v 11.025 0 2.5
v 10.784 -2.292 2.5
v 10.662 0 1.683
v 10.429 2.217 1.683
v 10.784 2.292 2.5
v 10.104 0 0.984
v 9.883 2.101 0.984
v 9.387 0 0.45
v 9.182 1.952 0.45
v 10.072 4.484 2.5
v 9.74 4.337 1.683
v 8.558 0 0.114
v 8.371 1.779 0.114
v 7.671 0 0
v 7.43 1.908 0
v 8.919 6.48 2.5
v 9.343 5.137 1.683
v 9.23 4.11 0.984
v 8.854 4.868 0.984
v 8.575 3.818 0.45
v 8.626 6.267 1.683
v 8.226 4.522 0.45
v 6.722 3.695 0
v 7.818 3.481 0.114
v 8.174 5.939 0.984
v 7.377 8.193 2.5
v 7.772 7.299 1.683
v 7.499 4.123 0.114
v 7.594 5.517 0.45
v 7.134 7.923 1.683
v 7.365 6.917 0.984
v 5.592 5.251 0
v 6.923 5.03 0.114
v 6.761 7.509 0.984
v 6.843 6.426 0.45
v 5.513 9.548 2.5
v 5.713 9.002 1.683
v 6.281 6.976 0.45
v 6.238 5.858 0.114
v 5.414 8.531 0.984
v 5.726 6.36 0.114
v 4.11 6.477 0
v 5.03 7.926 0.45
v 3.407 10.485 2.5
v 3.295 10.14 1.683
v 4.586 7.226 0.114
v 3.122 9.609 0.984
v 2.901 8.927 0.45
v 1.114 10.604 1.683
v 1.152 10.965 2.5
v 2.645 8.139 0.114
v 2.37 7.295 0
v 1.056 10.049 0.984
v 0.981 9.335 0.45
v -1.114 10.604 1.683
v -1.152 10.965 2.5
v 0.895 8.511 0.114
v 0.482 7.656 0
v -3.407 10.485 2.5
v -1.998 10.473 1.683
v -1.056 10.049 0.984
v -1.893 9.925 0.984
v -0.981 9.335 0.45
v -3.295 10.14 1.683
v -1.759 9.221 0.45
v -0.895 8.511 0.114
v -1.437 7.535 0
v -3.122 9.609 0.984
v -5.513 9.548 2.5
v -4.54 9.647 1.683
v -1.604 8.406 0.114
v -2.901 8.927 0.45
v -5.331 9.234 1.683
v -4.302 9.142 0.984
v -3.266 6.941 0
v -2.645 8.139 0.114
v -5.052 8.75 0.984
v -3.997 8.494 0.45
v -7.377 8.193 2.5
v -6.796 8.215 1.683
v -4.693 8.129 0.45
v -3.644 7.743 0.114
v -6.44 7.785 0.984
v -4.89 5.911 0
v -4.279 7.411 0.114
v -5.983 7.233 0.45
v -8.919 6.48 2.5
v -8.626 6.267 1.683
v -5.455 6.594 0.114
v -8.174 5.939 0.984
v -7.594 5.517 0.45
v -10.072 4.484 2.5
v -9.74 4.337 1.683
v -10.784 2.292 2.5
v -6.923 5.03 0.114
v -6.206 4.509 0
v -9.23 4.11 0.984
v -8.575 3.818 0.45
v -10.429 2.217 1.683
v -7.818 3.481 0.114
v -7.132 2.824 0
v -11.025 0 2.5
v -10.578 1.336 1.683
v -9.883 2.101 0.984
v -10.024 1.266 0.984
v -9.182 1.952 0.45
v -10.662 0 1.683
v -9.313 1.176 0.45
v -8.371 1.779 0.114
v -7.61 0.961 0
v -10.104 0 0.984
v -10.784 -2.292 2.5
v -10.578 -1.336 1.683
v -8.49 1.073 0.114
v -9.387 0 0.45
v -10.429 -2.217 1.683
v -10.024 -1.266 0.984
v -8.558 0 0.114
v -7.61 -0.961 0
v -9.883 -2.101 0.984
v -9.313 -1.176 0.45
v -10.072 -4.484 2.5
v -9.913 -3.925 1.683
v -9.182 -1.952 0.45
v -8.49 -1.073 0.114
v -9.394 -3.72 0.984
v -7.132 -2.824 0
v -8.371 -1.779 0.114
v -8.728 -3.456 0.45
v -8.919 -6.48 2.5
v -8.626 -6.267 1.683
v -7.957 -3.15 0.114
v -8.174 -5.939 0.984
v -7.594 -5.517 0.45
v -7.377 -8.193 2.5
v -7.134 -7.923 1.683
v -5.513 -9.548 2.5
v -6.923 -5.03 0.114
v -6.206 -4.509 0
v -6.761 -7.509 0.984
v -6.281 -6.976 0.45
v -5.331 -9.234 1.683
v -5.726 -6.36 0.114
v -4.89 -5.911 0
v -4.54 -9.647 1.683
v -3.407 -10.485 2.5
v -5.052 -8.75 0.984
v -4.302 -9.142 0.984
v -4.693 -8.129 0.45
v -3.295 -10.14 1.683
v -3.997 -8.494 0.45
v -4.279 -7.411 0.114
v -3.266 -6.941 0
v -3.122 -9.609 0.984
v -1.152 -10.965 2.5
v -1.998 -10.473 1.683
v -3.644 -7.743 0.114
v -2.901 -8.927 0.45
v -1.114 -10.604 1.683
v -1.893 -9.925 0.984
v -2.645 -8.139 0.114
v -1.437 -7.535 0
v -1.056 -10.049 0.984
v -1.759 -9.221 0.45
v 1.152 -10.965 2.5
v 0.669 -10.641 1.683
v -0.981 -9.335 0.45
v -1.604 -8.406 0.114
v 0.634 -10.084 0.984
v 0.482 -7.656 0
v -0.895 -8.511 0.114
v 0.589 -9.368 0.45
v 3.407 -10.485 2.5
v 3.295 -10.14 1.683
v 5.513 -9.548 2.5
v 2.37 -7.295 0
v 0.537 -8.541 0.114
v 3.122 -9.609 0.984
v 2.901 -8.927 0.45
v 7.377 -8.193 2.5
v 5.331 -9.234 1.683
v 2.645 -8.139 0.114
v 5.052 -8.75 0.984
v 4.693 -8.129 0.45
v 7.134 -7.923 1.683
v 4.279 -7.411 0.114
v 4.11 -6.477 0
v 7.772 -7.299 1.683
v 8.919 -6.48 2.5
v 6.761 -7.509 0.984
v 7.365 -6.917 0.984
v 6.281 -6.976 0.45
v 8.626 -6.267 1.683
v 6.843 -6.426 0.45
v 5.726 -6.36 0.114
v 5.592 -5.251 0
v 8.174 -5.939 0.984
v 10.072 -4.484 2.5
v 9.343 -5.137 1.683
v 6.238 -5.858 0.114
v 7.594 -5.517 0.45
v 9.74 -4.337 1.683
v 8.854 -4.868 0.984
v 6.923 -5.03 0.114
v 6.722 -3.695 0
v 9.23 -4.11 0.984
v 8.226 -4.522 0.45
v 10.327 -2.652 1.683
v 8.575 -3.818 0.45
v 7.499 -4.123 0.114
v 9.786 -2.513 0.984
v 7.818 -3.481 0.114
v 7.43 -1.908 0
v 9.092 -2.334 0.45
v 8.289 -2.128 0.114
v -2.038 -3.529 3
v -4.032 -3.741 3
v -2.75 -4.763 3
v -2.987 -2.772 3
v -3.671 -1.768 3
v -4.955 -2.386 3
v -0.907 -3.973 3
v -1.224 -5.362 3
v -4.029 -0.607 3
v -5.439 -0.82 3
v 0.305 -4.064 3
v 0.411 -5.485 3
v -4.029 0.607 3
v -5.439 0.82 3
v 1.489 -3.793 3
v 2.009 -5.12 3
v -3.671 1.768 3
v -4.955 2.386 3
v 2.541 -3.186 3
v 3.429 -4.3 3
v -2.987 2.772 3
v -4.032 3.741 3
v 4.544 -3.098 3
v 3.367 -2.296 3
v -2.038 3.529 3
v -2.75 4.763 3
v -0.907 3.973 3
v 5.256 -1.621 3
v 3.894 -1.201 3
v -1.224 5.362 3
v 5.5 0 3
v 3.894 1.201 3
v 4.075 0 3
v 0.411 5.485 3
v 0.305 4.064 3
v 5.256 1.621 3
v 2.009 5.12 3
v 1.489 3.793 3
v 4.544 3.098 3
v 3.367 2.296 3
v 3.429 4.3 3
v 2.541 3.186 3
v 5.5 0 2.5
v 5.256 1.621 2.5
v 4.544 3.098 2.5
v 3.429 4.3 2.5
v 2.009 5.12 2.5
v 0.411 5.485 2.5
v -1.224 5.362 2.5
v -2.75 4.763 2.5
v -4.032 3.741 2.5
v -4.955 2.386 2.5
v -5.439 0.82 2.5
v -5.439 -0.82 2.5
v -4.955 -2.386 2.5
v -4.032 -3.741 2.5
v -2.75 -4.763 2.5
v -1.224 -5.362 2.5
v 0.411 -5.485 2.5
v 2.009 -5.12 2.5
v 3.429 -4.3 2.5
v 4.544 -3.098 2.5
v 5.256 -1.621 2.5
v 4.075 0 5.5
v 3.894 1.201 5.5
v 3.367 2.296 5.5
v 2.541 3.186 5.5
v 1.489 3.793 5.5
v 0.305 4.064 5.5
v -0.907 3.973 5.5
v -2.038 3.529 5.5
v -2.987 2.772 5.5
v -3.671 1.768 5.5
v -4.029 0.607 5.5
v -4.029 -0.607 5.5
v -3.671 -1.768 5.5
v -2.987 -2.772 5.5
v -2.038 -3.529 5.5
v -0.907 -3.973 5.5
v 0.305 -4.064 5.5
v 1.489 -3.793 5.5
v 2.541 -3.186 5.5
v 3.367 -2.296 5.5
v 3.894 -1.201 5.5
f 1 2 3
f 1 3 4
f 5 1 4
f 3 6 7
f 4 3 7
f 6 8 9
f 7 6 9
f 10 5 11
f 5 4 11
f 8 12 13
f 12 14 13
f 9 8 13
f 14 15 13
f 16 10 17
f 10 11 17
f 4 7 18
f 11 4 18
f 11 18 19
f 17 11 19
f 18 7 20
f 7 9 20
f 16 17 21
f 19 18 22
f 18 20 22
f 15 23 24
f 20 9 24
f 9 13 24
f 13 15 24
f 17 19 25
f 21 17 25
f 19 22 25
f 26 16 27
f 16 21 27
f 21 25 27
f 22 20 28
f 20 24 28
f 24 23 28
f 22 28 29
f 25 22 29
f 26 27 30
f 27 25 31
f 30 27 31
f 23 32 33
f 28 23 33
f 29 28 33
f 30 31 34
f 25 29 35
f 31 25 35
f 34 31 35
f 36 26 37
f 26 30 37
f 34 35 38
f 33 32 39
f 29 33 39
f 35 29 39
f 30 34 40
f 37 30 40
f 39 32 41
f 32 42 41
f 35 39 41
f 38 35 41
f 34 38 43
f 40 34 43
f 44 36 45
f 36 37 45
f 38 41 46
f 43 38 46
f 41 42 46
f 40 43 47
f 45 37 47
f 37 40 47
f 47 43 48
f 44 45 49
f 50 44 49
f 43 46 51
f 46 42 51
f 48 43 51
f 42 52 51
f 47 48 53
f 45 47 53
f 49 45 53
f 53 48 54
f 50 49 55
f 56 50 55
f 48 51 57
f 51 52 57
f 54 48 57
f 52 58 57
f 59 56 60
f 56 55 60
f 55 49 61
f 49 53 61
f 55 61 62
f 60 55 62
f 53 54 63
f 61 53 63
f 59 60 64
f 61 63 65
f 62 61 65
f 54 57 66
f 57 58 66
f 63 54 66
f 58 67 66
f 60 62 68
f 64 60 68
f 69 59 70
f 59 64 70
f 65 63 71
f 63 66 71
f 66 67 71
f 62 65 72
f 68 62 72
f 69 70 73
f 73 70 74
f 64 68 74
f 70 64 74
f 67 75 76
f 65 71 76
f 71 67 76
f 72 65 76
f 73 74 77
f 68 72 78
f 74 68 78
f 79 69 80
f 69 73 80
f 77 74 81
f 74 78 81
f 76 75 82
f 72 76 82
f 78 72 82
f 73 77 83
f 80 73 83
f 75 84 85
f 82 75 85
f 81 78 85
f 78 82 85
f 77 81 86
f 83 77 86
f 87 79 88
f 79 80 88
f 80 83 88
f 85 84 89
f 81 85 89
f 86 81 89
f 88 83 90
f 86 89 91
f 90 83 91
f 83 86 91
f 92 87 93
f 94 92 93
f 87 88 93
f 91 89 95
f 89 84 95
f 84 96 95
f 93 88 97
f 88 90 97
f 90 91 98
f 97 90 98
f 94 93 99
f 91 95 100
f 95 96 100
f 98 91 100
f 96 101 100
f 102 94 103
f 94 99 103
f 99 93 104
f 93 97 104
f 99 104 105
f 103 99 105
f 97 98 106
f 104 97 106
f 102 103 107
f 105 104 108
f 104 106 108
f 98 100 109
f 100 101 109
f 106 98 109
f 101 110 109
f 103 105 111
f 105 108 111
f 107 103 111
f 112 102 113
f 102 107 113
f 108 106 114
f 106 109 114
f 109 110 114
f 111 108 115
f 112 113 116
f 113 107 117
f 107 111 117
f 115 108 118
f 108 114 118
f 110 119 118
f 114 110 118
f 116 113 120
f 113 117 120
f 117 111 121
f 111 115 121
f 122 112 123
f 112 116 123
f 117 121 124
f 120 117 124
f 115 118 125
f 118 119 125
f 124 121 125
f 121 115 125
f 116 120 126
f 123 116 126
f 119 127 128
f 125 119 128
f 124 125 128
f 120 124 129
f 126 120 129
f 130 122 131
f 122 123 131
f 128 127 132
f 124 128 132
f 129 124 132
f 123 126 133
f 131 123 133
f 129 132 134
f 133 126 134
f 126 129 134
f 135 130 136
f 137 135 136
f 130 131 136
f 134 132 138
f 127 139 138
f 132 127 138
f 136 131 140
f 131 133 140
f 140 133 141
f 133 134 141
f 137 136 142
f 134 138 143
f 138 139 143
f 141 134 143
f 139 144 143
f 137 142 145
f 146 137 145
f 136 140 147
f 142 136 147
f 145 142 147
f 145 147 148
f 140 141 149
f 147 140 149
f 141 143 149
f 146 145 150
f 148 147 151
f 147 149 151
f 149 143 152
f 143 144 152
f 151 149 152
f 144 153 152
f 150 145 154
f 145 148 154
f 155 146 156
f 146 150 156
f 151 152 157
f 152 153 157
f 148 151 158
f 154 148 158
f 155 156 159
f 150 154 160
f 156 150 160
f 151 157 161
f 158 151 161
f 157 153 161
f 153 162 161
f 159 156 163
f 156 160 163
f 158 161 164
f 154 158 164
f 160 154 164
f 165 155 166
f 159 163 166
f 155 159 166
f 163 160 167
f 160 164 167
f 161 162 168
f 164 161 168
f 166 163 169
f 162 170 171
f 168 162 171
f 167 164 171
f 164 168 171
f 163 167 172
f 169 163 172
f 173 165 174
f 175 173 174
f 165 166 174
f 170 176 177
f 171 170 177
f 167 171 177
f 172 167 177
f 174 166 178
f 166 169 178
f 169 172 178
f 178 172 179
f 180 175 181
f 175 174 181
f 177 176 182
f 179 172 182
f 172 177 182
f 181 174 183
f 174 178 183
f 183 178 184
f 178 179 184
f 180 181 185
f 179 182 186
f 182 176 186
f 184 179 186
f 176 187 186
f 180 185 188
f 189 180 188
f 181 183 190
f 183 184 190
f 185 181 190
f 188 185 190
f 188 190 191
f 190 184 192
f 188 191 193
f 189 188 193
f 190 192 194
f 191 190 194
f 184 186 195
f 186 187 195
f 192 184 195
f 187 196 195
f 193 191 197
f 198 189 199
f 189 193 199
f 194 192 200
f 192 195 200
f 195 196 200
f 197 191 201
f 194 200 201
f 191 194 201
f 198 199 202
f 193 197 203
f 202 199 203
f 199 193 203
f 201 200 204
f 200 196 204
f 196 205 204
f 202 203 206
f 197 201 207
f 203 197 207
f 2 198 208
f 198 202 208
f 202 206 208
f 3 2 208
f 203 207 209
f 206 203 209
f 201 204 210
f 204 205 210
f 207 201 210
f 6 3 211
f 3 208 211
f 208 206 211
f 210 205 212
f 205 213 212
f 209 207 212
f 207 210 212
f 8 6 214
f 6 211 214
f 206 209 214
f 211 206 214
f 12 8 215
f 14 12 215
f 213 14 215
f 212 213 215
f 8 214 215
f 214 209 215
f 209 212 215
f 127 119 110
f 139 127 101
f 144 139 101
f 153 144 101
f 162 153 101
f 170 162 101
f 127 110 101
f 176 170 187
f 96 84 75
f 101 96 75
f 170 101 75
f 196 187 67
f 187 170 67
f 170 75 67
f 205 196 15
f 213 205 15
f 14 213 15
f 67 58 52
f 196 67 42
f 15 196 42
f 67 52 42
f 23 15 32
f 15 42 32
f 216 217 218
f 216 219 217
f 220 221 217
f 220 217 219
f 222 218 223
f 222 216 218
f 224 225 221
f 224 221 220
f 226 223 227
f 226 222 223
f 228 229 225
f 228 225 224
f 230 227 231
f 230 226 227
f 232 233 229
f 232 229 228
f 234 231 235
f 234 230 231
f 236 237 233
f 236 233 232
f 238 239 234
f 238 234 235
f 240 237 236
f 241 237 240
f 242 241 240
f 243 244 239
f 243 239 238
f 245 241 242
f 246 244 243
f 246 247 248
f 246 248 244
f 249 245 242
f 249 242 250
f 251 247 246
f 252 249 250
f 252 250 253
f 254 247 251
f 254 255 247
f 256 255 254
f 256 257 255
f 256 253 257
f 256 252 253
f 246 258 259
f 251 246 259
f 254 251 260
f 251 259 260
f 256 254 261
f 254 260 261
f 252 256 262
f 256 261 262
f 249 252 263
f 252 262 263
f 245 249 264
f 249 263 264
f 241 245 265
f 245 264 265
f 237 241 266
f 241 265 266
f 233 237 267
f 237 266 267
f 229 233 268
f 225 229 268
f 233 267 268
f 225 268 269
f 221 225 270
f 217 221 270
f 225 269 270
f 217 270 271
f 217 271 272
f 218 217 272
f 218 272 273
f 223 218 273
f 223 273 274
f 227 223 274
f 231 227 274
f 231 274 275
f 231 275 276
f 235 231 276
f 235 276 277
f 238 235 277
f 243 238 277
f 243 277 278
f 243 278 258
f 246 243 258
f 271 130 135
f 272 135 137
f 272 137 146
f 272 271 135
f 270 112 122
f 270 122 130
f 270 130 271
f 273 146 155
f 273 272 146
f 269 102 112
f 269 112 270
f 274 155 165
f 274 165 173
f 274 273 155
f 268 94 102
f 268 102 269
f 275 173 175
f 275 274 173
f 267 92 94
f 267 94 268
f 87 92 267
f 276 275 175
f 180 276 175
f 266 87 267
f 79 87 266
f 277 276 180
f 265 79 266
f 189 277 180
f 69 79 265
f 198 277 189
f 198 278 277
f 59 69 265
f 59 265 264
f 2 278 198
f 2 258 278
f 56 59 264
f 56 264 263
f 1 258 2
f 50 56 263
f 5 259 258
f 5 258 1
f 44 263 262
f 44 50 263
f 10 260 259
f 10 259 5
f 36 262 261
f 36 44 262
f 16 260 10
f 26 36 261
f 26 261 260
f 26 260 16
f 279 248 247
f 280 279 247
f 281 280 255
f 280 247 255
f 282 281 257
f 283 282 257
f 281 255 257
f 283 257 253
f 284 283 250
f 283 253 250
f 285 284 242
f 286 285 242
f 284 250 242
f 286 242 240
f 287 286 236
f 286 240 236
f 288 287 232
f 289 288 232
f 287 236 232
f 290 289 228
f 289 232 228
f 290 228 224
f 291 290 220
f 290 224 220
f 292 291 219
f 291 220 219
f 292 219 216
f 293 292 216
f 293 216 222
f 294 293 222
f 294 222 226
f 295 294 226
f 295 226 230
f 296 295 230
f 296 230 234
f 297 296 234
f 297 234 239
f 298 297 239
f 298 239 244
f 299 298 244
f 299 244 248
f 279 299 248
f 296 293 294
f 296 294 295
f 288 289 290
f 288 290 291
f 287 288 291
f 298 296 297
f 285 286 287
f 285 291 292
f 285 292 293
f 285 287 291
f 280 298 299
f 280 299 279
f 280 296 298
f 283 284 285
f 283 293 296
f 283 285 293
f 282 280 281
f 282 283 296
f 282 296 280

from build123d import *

# Parameters (mm, degrees)
F0_R     = 11.025
F0_R_2   = 5.5
F1_DEPTH = 2.5
F0_R_3   = 4.075
F2_DEPTH = 3
F3_DEPTH = 5.5


# Not quite as in the source:
# - a fillet or chamfer that OpenCascade refuses, or shapes differently, is made with other operations: its cross-section is extruded or revolved along the edge and cut away or added


with BuildPart() as f1:
    # F0 (on Top) → F1 (new body)
    with BuildSketch(Plane.XY):
        Circle(F0_R)
        Circle(F0_R_2, mode=Mode.SUBTRACT)
    extrude(amount=F1_DEPTH)

    # F0 (on Top) → F2 (join)
    with BuildSketch(Plane.XY):
        Circle(F0_R_2)
        Circle(F0_R_3, mode=Mode.SUBTRACT)
    extrude(amount=F2_DEPTH)

    # F0 (on Top) → F3 (join)
    with BuildSketch(Plane.XY):
        Circle(F0_R_3)
    extrude(amount=F3_DEPTH)

    # F4: fillet of radius 3.5 on 1 edges, made by hand

    # F4_s1 → F4_t2 (revolve, cut)
    with BuildSketch(Plane.XZ):
        with BuildLine():
            ThreePointArc((11.025, 2.5), (9.7625481001, 0.6937569599), (7.6708980338, 0))
            Line((7.6708980338, 0), (11.025, 0))
            Line((11.025, 0), (11.025, 2.5))
        make_face()
    revolve(axis=Axis((0, 0, 0), (0, 0, 1)), mode=Mode.SUBTRACT)


solid = f1.part
